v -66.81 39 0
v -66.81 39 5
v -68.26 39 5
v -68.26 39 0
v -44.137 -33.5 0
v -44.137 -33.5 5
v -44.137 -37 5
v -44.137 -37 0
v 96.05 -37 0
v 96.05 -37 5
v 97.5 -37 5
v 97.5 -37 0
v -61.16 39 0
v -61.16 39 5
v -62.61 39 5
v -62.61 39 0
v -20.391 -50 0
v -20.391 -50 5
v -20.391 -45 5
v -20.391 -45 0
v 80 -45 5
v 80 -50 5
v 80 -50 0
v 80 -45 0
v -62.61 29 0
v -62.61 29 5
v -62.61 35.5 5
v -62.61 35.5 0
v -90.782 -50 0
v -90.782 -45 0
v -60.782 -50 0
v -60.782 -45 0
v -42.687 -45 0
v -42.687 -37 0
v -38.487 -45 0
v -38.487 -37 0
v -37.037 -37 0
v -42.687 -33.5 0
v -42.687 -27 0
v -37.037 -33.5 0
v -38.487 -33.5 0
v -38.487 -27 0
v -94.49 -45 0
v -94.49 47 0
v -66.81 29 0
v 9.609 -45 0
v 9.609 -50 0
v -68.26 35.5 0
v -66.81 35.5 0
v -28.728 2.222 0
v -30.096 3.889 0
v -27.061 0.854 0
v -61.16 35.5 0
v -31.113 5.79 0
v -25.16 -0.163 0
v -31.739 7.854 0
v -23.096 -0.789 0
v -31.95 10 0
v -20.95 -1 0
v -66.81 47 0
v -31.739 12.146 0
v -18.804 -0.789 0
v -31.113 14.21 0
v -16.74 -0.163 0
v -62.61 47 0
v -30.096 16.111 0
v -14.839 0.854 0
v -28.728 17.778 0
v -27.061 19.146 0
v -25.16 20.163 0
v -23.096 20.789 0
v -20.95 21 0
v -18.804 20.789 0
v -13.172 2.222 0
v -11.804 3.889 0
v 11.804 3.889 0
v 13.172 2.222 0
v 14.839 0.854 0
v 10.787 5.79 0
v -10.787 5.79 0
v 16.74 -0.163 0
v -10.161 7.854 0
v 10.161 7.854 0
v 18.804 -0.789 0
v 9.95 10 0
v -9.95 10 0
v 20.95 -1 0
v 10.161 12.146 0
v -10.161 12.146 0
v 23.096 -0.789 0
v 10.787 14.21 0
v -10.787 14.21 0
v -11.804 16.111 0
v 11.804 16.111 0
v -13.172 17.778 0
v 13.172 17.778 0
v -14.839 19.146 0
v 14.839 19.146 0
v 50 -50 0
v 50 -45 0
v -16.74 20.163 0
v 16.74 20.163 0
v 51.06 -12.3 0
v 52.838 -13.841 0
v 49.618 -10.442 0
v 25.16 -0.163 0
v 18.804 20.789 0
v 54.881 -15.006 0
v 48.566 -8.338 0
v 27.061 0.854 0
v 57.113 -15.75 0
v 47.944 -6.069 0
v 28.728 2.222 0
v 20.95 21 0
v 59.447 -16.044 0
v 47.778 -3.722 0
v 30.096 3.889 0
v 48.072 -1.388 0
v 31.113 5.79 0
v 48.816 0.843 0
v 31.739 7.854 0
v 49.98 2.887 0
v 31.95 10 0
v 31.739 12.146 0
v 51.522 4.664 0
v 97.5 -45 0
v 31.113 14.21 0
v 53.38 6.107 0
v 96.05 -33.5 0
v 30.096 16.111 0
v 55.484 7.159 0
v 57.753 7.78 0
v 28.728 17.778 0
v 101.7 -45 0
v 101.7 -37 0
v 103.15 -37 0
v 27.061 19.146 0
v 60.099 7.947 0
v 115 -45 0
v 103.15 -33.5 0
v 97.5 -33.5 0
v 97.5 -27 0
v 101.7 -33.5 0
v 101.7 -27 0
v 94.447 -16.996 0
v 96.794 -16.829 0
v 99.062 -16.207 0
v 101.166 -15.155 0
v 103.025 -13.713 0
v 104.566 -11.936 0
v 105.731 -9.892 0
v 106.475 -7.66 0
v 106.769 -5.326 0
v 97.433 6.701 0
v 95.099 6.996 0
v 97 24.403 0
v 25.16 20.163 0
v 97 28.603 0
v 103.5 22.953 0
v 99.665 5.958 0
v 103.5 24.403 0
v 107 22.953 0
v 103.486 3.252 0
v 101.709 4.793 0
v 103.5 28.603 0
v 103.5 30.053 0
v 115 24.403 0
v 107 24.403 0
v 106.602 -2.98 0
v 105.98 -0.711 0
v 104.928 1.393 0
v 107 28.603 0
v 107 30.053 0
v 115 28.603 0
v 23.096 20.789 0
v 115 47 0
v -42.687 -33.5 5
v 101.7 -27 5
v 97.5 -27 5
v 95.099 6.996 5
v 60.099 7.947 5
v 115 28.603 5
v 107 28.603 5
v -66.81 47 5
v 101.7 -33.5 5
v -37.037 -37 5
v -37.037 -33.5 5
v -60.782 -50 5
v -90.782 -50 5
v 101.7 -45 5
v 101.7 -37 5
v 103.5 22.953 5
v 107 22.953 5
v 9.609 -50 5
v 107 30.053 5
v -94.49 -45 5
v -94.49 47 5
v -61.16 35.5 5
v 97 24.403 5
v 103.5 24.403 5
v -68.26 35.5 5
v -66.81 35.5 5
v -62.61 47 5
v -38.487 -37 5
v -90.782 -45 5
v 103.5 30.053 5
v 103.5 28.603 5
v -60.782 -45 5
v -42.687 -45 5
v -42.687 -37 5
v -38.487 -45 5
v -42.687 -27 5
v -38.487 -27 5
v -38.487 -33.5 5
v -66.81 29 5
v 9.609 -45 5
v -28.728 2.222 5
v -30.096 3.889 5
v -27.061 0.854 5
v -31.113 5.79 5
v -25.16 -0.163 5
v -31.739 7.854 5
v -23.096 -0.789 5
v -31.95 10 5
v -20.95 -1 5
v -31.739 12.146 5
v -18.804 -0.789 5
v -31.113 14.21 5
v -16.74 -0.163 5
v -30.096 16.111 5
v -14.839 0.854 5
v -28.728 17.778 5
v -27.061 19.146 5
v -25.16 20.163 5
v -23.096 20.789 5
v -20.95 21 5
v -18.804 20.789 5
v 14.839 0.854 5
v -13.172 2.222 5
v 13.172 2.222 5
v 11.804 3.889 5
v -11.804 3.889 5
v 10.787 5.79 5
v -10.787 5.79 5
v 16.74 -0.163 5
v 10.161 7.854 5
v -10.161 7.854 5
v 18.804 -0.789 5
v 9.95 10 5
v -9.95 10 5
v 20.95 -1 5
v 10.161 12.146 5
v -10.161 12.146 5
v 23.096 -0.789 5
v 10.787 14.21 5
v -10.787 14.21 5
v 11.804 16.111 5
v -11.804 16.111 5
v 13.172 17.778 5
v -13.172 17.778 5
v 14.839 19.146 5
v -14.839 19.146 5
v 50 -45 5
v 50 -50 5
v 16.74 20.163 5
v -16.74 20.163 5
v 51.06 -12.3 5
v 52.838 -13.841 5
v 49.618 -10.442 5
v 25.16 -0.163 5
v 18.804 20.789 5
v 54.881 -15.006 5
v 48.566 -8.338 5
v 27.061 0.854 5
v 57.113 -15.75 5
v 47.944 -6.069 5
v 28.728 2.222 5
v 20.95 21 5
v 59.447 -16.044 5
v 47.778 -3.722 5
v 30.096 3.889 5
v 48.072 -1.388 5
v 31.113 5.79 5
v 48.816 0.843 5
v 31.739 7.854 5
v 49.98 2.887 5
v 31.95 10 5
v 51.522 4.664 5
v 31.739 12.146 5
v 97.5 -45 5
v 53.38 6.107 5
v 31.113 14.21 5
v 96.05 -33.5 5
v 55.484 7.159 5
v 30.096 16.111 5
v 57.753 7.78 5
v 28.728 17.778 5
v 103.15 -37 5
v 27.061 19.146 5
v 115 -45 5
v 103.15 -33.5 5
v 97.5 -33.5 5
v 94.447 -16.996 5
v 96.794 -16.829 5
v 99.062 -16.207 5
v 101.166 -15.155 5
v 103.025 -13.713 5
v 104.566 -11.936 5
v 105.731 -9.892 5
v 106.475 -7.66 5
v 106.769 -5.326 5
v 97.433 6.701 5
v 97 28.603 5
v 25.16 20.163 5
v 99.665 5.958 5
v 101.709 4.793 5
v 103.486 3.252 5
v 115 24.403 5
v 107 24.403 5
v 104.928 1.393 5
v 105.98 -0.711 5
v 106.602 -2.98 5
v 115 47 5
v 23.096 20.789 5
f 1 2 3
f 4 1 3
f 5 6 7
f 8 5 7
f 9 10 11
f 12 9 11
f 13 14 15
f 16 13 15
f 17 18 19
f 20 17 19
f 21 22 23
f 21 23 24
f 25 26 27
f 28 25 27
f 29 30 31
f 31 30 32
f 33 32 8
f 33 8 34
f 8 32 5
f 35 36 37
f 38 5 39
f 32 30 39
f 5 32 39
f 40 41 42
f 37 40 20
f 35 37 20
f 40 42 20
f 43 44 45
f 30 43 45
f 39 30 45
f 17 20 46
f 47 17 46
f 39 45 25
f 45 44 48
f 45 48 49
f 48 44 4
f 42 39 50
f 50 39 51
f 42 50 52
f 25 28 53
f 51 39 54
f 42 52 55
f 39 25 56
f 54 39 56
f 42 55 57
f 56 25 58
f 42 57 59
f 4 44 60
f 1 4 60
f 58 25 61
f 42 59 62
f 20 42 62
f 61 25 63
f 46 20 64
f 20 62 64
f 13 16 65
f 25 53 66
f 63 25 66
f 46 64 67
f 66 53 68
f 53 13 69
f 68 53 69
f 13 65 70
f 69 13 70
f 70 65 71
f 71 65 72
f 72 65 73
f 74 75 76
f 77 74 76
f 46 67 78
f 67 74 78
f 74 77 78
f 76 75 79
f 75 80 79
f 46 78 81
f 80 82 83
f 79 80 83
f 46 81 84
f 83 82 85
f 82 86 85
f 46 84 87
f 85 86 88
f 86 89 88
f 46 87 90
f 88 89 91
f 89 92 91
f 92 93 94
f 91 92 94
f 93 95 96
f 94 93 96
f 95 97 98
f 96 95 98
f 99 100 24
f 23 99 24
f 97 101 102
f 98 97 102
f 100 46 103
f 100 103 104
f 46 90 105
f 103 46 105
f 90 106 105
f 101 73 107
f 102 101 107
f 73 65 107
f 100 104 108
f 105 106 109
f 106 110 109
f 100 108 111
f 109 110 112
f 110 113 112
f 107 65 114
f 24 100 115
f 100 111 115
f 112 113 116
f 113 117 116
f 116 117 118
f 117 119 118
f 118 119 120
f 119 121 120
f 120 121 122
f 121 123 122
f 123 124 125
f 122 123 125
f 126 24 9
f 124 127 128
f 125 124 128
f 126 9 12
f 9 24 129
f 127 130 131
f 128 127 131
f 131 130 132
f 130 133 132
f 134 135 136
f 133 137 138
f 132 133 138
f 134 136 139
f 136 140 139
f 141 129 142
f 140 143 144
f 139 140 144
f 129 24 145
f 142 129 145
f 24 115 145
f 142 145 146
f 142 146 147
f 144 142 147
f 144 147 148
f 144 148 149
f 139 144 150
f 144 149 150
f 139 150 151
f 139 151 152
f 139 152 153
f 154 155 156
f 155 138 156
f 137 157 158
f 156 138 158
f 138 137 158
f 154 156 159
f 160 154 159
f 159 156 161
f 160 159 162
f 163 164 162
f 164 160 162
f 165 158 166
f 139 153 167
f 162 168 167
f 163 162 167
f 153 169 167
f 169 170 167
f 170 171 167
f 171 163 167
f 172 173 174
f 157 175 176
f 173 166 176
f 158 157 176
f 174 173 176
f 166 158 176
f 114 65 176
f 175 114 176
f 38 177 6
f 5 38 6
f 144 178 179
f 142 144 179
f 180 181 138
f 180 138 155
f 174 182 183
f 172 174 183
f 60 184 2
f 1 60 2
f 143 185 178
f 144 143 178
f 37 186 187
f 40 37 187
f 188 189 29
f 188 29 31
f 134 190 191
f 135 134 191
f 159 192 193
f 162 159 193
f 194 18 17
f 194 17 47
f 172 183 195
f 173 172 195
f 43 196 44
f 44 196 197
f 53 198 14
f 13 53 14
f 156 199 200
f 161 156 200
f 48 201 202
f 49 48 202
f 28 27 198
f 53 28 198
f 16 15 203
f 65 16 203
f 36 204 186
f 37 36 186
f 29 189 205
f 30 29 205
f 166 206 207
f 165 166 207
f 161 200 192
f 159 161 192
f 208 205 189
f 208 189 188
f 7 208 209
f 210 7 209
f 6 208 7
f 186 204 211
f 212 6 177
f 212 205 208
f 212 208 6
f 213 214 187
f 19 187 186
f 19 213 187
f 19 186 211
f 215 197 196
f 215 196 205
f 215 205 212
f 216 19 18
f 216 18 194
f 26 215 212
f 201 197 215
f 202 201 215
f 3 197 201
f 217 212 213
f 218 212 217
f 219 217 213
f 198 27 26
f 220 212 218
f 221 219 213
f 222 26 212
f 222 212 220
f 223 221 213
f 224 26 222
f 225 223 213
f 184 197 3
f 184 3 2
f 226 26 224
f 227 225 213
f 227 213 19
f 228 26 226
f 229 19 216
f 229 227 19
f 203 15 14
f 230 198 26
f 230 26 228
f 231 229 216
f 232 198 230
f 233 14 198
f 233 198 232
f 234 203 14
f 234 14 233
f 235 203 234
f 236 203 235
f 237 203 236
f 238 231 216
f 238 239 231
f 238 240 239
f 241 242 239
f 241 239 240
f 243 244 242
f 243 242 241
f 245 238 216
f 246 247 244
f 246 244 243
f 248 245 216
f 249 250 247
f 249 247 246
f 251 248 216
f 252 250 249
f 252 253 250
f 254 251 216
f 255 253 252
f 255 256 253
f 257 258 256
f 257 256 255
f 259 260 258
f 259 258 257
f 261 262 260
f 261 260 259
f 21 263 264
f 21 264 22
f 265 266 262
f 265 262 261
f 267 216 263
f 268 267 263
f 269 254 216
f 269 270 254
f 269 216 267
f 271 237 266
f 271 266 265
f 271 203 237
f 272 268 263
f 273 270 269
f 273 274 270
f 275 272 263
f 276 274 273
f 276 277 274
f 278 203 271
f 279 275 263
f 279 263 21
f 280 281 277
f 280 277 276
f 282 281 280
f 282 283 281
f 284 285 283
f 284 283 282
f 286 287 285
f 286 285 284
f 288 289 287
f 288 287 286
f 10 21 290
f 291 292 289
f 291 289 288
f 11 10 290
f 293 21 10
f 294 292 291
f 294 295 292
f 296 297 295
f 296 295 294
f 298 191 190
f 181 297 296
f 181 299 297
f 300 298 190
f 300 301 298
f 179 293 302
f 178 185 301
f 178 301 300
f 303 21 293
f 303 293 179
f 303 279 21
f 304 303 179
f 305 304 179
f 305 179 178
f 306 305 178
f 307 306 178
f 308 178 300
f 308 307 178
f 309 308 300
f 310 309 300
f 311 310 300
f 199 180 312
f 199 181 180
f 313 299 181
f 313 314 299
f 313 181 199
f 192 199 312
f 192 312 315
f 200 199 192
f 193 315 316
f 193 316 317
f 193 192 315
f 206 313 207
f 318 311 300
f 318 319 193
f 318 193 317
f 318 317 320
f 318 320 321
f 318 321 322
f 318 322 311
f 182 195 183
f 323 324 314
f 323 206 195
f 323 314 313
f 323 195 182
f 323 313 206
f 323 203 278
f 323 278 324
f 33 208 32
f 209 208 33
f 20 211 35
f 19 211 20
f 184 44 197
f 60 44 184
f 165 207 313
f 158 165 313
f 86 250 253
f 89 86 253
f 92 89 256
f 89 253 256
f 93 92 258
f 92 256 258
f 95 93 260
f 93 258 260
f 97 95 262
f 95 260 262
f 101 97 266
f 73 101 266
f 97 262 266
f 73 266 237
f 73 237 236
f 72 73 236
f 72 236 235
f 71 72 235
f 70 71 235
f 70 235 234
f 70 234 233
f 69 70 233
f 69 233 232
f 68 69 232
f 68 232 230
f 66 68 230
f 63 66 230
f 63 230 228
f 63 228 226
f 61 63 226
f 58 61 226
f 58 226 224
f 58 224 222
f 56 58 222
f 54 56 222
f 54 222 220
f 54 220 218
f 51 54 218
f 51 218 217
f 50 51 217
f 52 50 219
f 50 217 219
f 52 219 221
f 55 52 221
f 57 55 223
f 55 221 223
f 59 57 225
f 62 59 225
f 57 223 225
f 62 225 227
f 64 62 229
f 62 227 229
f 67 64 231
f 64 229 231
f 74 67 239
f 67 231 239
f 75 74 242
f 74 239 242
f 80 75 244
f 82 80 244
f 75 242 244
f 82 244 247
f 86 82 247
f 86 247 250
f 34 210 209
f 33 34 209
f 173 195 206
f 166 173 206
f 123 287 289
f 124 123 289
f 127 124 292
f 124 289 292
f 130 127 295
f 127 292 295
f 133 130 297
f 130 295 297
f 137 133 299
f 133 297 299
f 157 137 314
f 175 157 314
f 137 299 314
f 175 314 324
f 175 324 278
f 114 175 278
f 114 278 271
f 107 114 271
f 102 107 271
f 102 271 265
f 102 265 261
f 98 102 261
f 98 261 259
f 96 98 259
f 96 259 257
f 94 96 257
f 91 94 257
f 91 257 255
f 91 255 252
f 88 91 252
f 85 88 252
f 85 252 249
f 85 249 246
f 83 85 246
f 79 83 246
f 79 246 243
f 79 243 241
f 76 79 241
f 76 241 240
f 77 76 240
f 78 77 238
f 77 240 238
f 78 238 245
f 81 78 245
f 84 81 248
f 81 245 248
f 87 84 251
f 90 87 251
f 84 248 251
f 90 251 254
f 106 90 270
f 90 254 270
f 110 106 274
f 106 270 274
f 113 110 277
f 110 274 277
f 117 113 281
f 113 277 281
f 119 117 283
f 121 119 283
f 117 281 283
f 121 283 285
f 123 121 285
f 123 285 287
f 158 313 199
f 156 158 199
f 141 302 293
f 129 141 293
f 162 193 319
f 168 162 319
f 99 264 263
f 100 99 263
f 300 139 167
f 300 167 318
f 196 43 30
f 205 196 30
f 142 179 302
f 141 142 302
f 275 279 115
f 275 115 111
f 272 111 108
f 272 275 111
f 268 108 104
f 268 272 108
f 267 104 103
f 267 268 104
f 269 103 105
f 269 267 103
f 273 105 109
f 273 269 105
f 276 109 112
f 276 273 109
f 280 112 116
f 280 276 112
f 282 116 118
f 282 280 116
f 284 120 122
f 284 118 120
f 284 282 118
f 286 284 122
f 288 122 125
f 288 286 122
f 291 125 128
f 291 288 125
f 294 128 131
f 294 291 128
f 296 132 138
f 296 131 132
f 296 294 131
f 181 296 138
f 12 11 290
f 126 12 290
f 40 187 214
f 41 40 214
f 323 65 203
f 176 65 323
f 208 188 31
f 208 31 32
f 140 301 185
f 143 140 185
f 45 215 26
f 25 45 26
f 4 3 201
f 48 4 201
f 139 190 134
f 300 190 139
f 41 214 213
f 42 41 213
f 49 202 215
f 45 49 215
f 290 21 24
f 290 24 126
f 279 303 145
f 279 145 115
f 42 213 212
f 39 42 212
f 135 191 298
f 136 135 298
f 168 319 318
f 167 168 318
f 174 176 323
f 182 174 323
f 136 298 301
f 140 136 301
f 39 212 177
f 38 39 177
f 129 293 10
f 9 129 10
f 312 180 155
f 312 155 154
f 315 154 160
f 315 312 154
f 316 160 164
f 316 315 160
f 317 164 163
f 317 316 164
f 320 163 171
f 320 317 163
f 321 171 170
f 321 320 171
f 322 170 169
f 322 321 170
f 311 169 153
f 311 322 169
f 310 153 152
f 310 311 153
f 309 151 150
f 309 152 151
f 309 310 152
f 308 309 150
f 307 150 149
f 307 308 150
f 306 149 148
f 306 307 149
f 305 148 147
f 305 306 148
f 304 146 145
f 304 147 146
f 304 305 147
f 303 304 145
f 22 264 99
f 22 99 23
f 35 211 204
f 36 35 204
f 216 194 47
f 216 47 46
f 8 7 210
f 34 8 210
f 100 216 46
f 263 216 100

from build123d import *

# Parameters (mm, degrees)
SKETCH1_W           = 230
SKETCH1_H           = 90
BOSS_EXTRUDE1_DEPTH = 5
CUT_EXTRUDE1_REACH  = 125.592
SKETCH2_R           = 11
MOVE_FACE2_BY       = 2
SKETCH3_W           = 8.50990482
SKETCH3_H           = 6
CUT_EXTRUDE2_DEPTH  = 10
BOSS_EXTRUDE2_DEPTH = 5
SKETCH6_W           = 30
SKETCH6_H           = 5
BOSS_EXTRUDE3_DEPTH = 5
SKETCH12_W          = 74.296444361
SKETCH12_H          = 104.356394824
CUT_EXTRUDE6_DEPTH  = 10
CUT_EXTRUDE7_DEPTH  = 10
CUT_EXTRUDE8_DEPTH  = 10


with BuildPart() as part:
    # Sketch1 → Boss-Extrude1 (new body)
    with BuildSketch(Plane.XY):
        Rectangle(SKETCH1_W, SKETCH1_H)
    extrude(amount=BOSS_EXTRUDE1_DEPTH)

    # Sketch2 → Cut-Extrude1 (cut, up to next)
    with BuildSketch(Plane.XY.offset(5), mode=Mode.PRIVATE) as cut_extrude1_sk1:
        with Locations((-20.95, 10)):
            Circle(SKETCH2_R)
    cut_extrude1_tool1 = extrude(cut_extrude1_sk1.sketch, amount=-CUT_EXTRUDE1_REACH, mode=Mode.PRIVATE) & part.part
    # Sketch2 → Cut-Extrude1 (cut, up to next)
    with BuildSketch(Plane.XY.offset(5), mode=Mode.PRIVATE) as cut_extrude1_sk2:
        with Locations((20.95, 10)):
            Circle(SKETCH2_R)
    cut_extrude1_tool2 = extrude(cut_extrude1_sk2.sketch, amount=-CUT_EXTRUDE1_REACH, mode=Mode.PRIVATE) & part.part
    add(cut_extrude1_tool1.solids().sort_by_distance((-20.95, 10, 5))[0], mode=Mode.SUBTRACT)
    add(cut_extrude1_tool2.solids().sort_by_distance((20.95, 10, 5))[0], mode=Mode.SUBTRACT)

    # Move Face2: a face moved outward by 2.0
    extrude(part.faces().sort_by_distance((0, 45, 2.5))[0], amount=MOVE_FACE2_BY, dir=(0, 1, 0))

    # Sketch3 → Cut-Extrude2 (cut)
    with BuildSketch(Plane.XY.offset(5)):
        with Locations((-110.74504759, 44)):
            Rectangle(SKETCH3_W, SKETCH3_H)
    extrude(amount=-CUT_EXTRUDE2_DEPTH, mode=Mode.SUBTRACT)

    # Sketch4 → Boss-Extrude2 (add)
    with BuildSketch(Plane.XY.offset(5)):
        with BuildLine():
            Line((-135.913924796, 10.610415662), (-138.38302872, 1.395594371))
            Line((-138.38302872, 1.395594371), (-142.246732025, 2.430870552))
            Line((-142.246732025, 2.430870552), (-146.129017701, -12.058016843))
            Line((-146.129017701, -12.058016843), (-142.265314396, -13.093293023))
            Line((-142.265314396, -13.093293023), (-144.335866757, -20.820699634))
            Line((-144.335866757, -20.820699634), (-138.540311799, -22.373613904))
            Line((-138.540311799, -22.373613904), (-141.646140341, -33.96472382))
            ThreePointArc((-141.646140341, -33.96472382), (-140.955850397, -37.435045716), (-137.782437035, -39))
            Line((-137.782437035, -39), (-125.782437035, -39))
            Line((-125.782437035, -39), (-125.782437035, -45))
            Line((-125.782437035, -45), (-115, -45))
            Line((-115, -45), (-115, 41))
            Line((-115, 41), (-119.257422168, 41))
            ThreePointArc((-119.257422168, 41), (-121.083706455, 40.380060021), (-122.155199647, 38.776457135))
            Line((-122.155199647, 38.776457135), (-122.353798485, 38.03527618))
            Line((-122.353798485, 38.03527618), (-125.459627027, 26.444166265))
            Line((-125.459627027, 26.444166265), (-131.255181984, 27.997080536))
            Line((-131.255181984, 27.997080536), (-133.325734345, 20.269673925))
            Line((-133.325734345, 20.269673925), (-135.913924796, 10.610415662))
        make_face()
    extrude(amount=-BOSS_EXTRUDE2_DEPTH)

    # Sketch6 → Boss-Extrude3 (add)
    with BuildSketch(Plane.XY.offset(5)):
        with Locations((-75.782437035, -47.5)):
            Rectangle(SKETCH6_W, SKETCH6_H)
        with Locations((-5.391218518, -47.5)):
            Rectangle(SKETCH6_W, SKETCH6_H)
        with Locations((65, -47.5)):
            Rectangle(SKETCH6_W, SKETCH6_H)
    extrude(amount=-BOSS_EXTRUDE3_DEPTH)

    # Sketch12 → Cut-Extrude6 (cut)
    with BuildSketch(Plane.XY.offset(5)):
        with Locations((-131.638317361, -5.178197412)):
            Rectangle(SKETCH12_W, SKETCH12_H)
    extrude(amount=-CUT_EXTRUDE6_DEPTH, mode=Mode.SUBTRACT)

    # Sketch13 → Cut-Extrude7 (cut)
    with BuildSketch(Plane.XY.offset(5)):
        Polygon((-38.486827777, -37), (-37.036827777, -37), (-37.036827777, -33.5), (-38.486827777, -33.5), (-38.486827777, -27), (-42.686827777, -27), (-42.686827777, -33.5), (-44.136827777, -33.5), (-44.136827777, -37), (-42.686827777, -37), (-42.686827777, -45), (-38.486827777, -45), align=None)
        Polygon((101.7, -37), (103.15, -37), (103.15, -33.5), (101.7, -33.5), (101.7, -27), (97.5, -27), (97.5, -33.5), (96.05, -33.5), (96.05, -37), (97.5, -37), (97.5, -45), (101.7, -45), align=None)
        Polygon((107, 28.602956743), (107, 30.052956743), (103.5, 30.052956743), (103.5, 28.602956743), (97, 28.602956743), (97, 24.402956743), (103.5, 24.402956743), (103.5, 22.952956743), (107, 22.952956743), (107, 24.402956743), (115, 24.402956743), (115, 28.602956743), align=None)
        Polygon((-66.809520372, 39), (-68.259520372, 39), (-68.259520372, 35.5), (-66.809520372, 35.5), (-66.809520372, 29), (-62.609520372, 29), (-62.609520372, 35.5), (-61.159520372, 35.5), (-61.159520372, 39), (-62.609520372, 39), (-62.609520372, 47), (-66.809520372, 47), align=None)
    extrude(amount=-CUT_EXTRUDE7_DEPTH, mode=Mode.SUBTRACT)

    # Sketch14 → Cut-Extrude8 (cut)
    with BuildSketch(Plane.XY.offset(5)):
        with BuildLine():
            Line((94.447030587, -16.995566986), (59.447030587, -16.043949671))
            ThreePointArc((59.447030587, -16.043949671), (47.777611866, -3.722234421), (60.099327116, 7.947184301))
            Line((60.099327116, 7.947184301), (95.099327116, 6.995566986))
            ThreePointArc((95.099327116, 6.995566986), (106.768745837, -5.326148264), (94.447030587, -16.995566986))
        make_face()
    extrude(amount=-CUT_EXTRUDE8_DEPTH, mode=Mode.SUBTRACT)


solid = part.part
